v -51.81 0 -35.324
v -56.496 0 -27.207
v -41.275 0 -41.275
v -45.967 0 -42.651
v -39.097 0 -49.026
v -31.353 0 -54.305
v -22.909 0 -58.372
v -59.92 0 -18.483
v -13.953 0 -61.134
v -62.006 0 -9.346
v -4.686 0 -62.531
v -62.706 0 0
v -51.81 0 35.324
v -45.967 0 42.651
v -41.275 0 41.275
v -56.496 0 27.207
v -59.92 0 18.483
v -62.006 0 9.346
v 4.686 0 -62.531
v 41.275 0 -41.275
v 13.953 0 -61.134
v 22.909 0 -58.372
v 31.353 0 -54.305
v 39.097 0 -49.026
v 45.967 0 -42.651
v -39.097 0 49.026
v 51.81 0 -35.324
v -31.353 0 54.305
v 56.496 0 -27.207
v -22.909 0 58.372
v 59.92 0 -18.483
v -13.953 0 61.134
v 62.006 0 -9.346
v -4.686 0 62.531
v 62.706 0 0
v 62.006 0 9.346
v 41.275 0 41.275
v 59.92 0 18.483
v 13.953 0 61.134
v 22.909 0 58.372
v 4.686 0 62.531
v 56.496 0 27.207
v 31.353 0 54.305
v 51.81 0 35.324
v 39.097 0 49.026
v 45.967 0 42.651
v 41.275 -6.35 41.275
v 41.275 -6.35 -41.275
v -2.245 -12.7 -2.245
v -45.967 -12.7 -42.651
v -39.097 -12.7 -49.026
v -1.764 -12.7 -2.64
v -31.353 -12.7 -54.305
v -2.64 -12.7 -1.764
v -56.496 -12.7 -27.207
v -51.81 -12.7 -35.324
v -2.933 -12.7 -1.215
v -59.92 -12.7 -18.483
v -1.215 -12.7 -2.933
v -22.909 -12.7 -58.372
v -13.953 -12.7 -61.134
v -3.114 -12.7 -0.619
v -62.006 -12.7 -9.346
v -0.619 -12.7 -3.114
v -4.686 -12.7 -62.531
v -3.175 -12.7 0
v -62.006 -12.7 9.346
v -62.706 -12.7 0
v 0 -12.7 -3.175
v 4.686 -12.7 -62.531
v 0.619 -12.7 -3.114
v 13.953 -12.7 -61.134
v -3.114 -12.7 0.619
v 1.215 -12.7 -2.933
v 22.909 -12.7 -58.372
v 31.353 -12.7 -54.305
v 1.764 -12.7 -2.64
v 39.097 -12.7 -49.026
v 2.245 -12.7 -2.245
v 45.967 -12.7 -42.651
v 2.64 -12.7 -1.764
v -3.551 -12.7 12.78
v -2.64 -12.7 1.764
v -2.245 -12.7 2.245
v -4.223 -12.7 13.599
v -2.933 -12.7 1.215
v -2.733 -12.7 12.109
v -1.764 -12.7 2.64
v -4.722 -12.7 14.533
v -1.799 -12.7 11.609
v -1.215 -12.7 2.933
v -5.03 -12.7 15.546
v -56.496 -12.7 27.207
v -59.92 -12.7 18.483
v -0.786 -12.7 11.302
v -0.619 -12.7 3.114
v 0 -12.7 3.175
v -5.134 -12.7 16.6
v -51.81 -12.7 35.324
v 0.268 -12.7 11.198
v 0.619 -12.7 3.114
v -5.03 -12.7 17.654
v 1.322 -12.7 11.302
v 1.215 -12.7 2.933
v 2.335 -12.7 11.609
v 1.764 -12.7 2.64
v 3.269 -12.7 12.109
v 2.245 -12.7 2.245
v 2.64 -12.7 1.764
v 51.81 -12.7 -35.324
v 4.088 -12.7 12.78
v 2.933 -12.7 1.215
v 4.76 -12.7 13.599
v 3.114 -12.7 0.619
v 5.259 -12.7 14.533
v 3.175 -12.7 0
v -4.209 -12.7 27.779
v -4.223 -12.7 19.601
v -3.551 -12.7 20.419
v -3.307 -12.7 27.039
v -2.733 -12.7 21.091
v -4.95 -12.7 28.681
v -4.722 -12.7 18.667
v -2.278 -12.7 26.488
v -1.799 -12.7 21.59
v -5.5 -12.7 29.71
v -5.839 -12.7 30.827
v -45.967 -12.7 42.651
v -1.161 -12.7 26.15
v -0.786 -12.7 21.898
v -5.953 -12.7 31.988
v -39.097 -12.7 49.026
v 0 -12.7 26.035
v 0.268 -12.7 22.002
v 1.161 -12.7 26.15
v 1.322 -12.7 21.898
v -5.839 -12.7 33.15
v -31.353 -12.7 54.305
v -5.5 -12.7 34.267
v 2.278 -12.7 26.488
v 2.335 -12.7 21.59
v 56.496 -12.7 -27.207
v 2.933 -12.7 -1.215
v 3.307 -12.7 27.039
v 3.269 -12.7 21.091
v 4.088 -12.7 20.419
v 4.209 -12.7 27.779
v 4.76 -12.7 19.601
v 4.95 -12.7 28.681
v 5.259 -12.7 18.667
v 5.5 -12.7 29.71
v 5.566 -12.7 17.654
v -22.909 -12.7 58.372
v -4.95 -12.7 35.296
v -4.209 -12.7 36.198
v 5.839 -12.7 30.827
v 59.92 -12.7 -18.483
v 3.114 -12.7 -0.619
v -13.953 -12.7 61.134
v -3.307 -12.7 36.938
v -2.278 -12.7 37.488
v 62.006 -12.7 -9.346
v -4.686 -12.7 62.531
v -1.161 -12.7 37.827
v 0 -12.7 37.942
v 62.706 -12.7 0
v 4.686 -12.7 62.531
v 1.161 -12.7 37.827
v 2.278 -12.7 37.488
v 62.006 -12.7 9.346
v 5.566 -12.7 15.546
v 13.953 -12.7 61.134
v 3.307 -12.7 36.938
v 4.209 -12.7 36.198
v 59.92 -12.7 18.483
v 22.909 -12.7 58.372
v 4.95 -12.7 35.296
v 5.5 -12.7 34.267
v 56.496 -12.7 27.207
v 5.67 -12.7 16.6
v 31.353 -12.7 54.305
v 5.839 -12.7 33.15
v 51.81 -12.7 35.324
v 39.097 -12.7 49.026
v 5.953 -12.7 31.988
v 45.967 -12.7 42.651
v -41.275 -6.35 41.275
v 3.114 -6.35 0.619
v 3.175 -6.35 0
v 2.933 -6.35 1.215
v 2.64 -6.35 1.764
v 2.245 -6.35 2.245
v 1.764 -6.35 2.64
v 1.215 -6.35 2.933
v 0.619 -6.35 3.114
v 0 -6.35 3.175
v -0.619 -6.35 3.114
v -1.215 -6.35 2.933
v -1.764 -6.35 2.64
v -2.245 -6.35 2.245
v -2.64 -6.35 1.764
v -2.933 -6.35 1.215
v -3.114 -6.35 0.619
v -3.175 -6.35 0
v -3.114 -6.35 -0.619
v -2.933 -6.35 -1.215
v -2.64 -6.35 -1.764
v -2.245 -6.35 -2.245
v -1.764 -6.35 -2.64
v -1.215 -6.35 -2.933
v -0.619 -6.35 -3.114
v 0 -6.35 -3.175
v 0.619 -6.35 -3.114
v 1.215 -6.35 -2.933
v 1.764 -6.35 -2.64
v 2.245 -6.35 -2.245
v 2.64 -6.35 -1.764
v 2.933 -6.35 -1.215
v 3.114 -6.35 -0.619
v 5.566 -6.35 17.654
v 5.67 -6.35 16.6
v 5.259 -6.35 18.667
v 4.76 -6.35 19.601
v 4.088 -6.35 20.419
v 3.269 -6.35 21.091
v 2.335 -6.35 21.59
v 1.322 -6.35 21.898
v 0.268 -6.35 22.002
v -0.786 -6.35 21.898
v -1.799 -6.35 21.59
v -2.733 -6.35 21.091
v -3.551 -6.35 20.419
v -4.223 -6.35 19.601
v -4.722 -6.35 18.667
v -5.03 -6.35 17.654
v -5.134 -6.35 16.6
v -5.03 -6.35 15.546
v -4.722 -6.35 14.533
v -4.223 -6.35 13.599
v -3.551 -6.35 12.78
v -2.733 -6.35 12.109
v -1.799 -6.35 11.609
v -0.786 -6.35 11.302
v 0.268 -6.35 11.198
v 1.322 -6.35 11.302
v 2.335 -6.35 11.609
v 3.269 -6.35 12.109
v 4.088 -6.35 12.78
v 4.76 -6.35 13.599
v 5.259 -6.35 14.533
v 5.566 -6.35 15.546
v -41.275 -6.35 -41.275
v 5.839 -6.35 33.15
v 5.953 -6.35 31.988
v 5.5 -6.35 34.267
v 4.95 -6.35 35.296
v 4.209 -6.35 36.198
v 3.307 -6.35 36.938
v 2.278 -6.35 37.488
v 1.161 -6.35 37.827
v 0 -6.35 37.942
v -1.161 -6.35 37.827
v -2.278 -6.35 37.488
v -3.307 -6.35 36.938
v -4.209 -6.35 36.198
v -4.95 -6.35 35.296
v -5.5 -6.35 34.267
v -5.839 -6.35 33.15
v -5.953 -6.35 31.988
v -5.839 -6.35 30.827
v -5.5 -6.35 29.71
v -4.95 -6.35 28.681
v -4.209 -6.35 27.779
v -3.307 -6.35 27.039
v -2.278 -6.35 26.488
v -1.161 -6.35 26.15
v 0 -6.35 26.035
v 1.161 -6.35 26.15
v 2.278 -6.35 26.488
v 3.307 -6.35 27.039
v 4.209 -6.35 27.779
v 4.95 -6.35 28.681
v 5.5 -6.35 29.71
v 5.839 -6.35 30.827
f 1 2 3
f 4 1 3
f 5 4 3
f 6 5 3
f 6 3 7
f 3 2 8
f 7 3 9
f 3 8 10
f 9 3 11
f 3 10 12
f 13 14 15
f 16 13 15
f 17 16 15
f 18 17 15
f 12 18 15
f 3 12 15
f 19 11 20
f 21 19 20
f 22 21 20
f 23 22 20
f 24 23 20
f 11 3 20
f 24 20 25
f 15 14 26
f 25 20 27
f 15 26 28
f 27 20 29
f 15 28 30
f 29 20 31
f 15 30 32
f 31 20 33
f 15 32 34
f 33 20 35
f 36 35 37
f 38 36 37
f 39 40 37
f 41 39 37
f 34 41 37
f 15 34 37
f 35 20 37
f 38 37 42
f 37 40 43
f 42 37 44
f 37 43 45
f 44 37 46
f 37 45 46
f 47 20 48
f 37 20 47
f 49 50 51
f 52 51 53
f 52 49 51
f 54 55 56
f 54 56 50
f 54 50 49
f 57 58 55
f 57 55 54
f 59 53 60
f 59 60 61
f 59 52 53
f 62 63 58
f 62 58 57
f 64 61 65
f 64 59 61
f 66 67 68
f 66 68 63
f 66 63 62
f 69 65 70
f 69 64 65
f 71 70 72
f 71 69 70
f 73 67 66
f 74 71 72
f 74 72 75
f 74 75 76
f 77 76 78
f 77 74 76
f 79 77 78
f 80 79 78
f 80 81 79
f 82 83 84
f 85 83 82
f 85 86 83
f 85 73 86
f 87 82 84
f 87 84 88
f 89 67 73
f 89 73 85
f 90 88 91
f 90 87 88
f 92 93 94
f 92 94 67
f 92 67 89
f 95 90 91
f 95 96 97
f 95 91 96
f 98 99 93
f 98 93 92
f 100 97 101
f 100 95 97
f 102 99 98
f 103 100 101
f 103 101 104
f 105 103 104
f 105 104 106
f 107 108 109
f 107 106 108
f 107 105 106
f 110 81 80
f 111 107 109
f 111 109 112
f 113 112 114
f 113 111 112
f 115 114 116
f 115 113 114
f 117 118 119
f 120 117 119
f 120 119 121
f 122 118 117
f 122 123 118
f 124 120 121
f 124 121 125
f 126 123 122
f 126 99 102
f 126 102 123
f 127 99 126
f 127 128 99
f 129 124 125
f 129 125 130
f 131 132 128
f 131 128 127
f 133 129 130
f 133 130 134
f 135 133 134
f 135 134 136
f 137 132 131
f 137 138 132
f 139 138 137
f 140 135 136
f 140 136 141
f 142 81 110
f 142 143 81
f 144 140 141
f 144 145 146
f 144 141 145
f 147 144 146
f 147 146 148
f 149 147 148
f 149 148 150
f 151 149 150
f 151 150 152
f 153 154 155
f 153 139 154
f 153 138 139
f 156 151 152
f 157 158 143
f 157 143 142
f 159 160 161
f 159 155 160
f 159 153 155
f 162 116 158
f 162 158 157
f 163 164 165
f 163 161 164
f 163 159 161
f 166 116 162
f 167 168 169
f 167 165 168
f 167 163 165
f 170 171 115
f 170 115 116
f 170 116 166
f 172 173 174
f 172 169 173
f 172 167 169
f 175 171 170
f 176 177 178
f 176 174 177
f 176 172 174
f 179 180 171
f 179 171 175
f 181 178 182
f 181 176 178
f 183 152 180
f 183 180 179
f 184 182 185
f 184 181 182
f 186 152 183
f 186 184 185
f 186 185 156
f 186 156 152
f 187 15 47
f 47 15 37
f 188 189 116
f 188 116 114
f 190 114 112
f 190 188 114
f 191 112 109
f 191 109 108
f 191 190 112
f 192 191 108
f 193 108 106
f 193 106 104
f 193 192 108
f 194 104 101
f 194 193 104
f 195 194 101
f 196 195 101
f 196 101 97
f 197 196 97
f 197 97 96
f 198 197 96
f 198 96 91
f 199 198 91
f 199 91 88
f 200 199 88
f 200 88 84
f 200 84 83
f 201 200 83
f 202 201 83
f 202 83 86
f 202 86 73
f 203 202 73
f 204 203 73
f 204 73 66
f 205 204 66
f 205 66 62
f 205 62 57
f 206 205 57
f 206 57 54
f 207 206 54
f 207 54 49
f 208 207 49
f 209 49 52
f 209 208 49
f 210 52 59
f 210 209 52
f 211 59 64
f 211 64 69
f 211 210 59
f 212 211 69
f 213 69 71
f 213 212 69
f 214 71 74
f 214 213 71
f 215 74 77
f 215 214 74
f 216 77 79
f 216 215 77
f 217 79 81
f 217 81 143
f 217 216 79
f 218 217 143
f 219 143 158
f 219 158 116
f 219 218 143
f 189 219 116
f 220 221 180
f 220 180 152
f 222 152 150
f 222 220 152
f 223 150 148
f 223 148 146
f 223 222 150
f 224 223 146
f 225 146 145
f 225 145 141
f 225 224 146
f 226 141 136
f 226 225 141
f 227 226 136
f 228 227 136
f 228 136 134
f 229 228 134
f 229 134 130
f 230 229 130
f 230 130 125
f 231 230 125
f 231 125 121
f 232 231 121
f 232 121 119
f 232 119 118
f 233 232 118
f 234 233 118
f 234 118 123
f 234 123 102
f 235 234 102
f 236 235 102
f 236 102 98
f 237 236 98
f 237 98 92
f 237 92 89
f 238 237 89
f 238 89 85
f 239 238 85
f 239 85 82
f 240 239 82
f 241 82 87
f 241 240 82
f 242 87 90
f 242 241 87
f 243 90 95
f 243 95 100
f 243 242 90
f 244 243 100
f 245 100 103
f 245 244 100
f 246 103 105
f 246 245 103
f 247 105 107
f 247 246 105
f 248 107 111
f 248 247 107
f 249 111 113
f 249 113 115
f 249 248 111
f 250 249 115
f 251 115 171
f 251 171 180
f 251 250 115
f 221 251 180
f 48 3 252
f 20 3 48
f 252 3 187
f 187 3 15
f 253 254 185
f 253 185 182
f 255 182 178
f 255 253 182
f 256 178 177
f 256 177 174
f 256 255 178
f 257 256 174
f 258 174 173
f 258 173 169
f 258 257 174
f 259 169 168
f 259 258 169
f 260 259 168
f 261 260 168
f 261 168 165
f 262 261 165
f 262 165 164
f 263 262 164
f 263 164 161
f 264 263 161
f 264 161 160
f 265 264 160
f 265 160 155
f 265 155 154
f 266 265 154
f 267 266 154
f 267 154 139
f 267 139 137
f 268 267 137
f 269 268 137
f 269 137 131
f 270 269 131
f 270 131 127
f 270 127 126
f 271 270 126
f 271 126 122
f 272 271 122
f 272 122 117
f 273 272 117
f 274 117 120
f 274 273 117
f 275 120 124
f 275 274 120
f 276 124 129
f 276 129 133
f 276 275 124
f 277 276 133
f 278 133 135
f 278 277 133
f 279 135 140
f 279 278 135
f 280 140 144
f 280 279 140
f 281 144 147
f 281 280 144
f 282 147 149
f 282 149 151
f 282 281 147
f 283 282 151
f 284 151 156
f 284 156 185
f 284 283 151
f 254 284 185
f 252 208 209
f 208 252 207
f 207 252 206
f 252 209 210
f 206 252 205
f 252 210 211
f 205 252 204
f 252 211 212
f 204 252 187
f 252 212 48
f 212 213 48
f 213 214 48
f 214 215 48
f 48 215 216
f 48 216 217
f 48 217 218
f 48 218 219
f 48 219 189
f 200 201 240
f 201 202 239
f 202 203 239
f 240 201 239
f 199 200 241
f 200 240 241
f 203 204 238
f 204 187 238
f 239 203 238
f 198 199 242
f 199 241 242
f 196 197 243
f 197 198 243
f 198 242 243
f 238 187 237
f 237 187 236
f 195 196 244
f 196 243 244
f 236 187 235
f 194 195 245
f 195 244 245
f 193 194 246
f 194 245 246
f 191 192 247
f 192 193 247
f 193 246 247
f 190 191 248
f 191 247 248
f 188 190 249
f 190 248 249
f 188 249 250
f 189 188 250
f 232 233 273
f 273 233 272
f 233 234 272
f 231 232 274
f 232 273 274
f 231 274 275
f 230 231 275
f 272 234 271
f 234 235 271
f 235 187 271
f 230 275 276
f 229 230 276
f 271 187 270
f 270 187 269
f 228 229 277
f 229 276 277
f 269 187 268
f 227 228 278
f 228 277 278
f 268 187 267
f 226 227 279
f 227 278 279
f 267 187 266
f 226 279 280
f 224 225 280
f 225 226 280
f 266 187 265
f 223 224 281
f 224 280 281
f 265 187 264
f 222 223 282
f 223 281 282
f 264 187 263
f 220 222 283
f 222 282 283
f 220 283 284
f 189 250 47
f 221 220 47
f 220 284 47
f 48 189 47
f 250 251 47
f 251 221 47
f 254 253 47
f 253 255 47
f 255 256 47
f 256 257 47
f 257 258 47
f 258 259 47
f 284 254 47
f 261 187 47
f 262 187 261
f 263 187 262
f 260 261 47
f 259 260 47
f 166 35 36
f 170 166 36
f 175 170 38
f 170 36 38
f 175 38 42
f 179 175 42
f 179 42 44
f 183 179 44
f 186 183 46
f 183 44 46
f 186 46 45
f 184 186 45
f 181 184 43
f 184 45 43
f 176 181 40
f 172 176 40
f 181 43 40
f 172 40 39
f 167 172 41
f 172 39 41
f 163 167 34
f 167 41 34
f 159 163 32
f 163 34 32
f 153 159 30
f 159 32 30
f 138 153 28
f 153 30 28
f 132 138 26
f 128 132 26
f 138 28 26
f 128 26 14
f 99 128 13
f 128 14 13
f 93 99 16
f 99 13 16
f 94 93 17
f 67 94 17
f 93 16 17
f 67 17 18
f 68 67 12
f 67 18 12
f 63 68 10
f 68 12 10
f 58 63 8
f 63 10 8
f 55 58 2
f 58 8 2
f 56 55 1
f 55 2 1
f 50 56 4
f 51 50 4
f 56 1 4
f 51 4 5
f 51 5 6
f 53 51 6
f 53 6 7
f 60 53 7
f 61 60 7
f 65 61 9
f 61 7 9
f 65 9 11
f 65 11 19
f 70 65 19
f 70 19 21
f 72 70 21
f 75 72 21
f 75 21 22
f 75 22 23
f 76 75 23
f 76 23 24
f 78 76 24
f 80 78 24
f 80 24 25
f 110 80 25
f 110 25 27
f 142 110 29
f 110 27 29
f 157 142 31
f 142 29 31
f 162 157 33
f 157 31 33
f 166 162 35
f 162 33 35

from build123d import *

# Parameters (mm, degrees)
F0_R     = 62.70625
F0_W     = 82.55
F0_H     = 82.55
F1_DEPTH = 12.7
F0_R_2   = 3.175
F0_R_3   = 5.401743
F0_R_4   = 5.953125
F2_DEPTH = 12.7
F3_DEPTH = 6.35


with BuildPart() as f1:
    # F0 (on Front) → F1 (new body)
    with BuildSketch(Plane.XZ):
        Circle(F0_R)
        Rectangle(F0_W, F0_H, mode=Mode.SUBTRACT)
    extrude(amount=F1_DEPTH)

    # F0 (on Front) → F2 (join)
    with BuildSketch(Plane.XZ):
        Rectangle(F0_W, F0_H)
        Circle(F0_R_2, mode=Mode.SUBTRACT)
        with Locations((0.268197, 16.59989)):
            Circle(F0_R_3, mode=Mode.SUBTRACT)
        with Locations((0, 31.988421)):
            Circle(F0_R_4, mode=Mode.SUBTRACT)
    extrude(amount=F2_DEPTH)

    # F0 (on Front) → F3 (cut)
    with BuildSketch(Plane.XZ):
        Rectangle(F0_W, F0_H)
        Circle(F0_R_2, mode=Mode.SUBTRACT)
        with Locations((0.268197, 16.59989)):
            Circle(F0_R_3, mode=Mode.SUBTRACT)
        with Locations((0, 31.988421)):
            Circle(F0_R_4, mode=Mode.SUBTRACT)
    extrude(amount=F3_DEPTH, mode=Mode.SUBTRACT)


solid = f1.part
